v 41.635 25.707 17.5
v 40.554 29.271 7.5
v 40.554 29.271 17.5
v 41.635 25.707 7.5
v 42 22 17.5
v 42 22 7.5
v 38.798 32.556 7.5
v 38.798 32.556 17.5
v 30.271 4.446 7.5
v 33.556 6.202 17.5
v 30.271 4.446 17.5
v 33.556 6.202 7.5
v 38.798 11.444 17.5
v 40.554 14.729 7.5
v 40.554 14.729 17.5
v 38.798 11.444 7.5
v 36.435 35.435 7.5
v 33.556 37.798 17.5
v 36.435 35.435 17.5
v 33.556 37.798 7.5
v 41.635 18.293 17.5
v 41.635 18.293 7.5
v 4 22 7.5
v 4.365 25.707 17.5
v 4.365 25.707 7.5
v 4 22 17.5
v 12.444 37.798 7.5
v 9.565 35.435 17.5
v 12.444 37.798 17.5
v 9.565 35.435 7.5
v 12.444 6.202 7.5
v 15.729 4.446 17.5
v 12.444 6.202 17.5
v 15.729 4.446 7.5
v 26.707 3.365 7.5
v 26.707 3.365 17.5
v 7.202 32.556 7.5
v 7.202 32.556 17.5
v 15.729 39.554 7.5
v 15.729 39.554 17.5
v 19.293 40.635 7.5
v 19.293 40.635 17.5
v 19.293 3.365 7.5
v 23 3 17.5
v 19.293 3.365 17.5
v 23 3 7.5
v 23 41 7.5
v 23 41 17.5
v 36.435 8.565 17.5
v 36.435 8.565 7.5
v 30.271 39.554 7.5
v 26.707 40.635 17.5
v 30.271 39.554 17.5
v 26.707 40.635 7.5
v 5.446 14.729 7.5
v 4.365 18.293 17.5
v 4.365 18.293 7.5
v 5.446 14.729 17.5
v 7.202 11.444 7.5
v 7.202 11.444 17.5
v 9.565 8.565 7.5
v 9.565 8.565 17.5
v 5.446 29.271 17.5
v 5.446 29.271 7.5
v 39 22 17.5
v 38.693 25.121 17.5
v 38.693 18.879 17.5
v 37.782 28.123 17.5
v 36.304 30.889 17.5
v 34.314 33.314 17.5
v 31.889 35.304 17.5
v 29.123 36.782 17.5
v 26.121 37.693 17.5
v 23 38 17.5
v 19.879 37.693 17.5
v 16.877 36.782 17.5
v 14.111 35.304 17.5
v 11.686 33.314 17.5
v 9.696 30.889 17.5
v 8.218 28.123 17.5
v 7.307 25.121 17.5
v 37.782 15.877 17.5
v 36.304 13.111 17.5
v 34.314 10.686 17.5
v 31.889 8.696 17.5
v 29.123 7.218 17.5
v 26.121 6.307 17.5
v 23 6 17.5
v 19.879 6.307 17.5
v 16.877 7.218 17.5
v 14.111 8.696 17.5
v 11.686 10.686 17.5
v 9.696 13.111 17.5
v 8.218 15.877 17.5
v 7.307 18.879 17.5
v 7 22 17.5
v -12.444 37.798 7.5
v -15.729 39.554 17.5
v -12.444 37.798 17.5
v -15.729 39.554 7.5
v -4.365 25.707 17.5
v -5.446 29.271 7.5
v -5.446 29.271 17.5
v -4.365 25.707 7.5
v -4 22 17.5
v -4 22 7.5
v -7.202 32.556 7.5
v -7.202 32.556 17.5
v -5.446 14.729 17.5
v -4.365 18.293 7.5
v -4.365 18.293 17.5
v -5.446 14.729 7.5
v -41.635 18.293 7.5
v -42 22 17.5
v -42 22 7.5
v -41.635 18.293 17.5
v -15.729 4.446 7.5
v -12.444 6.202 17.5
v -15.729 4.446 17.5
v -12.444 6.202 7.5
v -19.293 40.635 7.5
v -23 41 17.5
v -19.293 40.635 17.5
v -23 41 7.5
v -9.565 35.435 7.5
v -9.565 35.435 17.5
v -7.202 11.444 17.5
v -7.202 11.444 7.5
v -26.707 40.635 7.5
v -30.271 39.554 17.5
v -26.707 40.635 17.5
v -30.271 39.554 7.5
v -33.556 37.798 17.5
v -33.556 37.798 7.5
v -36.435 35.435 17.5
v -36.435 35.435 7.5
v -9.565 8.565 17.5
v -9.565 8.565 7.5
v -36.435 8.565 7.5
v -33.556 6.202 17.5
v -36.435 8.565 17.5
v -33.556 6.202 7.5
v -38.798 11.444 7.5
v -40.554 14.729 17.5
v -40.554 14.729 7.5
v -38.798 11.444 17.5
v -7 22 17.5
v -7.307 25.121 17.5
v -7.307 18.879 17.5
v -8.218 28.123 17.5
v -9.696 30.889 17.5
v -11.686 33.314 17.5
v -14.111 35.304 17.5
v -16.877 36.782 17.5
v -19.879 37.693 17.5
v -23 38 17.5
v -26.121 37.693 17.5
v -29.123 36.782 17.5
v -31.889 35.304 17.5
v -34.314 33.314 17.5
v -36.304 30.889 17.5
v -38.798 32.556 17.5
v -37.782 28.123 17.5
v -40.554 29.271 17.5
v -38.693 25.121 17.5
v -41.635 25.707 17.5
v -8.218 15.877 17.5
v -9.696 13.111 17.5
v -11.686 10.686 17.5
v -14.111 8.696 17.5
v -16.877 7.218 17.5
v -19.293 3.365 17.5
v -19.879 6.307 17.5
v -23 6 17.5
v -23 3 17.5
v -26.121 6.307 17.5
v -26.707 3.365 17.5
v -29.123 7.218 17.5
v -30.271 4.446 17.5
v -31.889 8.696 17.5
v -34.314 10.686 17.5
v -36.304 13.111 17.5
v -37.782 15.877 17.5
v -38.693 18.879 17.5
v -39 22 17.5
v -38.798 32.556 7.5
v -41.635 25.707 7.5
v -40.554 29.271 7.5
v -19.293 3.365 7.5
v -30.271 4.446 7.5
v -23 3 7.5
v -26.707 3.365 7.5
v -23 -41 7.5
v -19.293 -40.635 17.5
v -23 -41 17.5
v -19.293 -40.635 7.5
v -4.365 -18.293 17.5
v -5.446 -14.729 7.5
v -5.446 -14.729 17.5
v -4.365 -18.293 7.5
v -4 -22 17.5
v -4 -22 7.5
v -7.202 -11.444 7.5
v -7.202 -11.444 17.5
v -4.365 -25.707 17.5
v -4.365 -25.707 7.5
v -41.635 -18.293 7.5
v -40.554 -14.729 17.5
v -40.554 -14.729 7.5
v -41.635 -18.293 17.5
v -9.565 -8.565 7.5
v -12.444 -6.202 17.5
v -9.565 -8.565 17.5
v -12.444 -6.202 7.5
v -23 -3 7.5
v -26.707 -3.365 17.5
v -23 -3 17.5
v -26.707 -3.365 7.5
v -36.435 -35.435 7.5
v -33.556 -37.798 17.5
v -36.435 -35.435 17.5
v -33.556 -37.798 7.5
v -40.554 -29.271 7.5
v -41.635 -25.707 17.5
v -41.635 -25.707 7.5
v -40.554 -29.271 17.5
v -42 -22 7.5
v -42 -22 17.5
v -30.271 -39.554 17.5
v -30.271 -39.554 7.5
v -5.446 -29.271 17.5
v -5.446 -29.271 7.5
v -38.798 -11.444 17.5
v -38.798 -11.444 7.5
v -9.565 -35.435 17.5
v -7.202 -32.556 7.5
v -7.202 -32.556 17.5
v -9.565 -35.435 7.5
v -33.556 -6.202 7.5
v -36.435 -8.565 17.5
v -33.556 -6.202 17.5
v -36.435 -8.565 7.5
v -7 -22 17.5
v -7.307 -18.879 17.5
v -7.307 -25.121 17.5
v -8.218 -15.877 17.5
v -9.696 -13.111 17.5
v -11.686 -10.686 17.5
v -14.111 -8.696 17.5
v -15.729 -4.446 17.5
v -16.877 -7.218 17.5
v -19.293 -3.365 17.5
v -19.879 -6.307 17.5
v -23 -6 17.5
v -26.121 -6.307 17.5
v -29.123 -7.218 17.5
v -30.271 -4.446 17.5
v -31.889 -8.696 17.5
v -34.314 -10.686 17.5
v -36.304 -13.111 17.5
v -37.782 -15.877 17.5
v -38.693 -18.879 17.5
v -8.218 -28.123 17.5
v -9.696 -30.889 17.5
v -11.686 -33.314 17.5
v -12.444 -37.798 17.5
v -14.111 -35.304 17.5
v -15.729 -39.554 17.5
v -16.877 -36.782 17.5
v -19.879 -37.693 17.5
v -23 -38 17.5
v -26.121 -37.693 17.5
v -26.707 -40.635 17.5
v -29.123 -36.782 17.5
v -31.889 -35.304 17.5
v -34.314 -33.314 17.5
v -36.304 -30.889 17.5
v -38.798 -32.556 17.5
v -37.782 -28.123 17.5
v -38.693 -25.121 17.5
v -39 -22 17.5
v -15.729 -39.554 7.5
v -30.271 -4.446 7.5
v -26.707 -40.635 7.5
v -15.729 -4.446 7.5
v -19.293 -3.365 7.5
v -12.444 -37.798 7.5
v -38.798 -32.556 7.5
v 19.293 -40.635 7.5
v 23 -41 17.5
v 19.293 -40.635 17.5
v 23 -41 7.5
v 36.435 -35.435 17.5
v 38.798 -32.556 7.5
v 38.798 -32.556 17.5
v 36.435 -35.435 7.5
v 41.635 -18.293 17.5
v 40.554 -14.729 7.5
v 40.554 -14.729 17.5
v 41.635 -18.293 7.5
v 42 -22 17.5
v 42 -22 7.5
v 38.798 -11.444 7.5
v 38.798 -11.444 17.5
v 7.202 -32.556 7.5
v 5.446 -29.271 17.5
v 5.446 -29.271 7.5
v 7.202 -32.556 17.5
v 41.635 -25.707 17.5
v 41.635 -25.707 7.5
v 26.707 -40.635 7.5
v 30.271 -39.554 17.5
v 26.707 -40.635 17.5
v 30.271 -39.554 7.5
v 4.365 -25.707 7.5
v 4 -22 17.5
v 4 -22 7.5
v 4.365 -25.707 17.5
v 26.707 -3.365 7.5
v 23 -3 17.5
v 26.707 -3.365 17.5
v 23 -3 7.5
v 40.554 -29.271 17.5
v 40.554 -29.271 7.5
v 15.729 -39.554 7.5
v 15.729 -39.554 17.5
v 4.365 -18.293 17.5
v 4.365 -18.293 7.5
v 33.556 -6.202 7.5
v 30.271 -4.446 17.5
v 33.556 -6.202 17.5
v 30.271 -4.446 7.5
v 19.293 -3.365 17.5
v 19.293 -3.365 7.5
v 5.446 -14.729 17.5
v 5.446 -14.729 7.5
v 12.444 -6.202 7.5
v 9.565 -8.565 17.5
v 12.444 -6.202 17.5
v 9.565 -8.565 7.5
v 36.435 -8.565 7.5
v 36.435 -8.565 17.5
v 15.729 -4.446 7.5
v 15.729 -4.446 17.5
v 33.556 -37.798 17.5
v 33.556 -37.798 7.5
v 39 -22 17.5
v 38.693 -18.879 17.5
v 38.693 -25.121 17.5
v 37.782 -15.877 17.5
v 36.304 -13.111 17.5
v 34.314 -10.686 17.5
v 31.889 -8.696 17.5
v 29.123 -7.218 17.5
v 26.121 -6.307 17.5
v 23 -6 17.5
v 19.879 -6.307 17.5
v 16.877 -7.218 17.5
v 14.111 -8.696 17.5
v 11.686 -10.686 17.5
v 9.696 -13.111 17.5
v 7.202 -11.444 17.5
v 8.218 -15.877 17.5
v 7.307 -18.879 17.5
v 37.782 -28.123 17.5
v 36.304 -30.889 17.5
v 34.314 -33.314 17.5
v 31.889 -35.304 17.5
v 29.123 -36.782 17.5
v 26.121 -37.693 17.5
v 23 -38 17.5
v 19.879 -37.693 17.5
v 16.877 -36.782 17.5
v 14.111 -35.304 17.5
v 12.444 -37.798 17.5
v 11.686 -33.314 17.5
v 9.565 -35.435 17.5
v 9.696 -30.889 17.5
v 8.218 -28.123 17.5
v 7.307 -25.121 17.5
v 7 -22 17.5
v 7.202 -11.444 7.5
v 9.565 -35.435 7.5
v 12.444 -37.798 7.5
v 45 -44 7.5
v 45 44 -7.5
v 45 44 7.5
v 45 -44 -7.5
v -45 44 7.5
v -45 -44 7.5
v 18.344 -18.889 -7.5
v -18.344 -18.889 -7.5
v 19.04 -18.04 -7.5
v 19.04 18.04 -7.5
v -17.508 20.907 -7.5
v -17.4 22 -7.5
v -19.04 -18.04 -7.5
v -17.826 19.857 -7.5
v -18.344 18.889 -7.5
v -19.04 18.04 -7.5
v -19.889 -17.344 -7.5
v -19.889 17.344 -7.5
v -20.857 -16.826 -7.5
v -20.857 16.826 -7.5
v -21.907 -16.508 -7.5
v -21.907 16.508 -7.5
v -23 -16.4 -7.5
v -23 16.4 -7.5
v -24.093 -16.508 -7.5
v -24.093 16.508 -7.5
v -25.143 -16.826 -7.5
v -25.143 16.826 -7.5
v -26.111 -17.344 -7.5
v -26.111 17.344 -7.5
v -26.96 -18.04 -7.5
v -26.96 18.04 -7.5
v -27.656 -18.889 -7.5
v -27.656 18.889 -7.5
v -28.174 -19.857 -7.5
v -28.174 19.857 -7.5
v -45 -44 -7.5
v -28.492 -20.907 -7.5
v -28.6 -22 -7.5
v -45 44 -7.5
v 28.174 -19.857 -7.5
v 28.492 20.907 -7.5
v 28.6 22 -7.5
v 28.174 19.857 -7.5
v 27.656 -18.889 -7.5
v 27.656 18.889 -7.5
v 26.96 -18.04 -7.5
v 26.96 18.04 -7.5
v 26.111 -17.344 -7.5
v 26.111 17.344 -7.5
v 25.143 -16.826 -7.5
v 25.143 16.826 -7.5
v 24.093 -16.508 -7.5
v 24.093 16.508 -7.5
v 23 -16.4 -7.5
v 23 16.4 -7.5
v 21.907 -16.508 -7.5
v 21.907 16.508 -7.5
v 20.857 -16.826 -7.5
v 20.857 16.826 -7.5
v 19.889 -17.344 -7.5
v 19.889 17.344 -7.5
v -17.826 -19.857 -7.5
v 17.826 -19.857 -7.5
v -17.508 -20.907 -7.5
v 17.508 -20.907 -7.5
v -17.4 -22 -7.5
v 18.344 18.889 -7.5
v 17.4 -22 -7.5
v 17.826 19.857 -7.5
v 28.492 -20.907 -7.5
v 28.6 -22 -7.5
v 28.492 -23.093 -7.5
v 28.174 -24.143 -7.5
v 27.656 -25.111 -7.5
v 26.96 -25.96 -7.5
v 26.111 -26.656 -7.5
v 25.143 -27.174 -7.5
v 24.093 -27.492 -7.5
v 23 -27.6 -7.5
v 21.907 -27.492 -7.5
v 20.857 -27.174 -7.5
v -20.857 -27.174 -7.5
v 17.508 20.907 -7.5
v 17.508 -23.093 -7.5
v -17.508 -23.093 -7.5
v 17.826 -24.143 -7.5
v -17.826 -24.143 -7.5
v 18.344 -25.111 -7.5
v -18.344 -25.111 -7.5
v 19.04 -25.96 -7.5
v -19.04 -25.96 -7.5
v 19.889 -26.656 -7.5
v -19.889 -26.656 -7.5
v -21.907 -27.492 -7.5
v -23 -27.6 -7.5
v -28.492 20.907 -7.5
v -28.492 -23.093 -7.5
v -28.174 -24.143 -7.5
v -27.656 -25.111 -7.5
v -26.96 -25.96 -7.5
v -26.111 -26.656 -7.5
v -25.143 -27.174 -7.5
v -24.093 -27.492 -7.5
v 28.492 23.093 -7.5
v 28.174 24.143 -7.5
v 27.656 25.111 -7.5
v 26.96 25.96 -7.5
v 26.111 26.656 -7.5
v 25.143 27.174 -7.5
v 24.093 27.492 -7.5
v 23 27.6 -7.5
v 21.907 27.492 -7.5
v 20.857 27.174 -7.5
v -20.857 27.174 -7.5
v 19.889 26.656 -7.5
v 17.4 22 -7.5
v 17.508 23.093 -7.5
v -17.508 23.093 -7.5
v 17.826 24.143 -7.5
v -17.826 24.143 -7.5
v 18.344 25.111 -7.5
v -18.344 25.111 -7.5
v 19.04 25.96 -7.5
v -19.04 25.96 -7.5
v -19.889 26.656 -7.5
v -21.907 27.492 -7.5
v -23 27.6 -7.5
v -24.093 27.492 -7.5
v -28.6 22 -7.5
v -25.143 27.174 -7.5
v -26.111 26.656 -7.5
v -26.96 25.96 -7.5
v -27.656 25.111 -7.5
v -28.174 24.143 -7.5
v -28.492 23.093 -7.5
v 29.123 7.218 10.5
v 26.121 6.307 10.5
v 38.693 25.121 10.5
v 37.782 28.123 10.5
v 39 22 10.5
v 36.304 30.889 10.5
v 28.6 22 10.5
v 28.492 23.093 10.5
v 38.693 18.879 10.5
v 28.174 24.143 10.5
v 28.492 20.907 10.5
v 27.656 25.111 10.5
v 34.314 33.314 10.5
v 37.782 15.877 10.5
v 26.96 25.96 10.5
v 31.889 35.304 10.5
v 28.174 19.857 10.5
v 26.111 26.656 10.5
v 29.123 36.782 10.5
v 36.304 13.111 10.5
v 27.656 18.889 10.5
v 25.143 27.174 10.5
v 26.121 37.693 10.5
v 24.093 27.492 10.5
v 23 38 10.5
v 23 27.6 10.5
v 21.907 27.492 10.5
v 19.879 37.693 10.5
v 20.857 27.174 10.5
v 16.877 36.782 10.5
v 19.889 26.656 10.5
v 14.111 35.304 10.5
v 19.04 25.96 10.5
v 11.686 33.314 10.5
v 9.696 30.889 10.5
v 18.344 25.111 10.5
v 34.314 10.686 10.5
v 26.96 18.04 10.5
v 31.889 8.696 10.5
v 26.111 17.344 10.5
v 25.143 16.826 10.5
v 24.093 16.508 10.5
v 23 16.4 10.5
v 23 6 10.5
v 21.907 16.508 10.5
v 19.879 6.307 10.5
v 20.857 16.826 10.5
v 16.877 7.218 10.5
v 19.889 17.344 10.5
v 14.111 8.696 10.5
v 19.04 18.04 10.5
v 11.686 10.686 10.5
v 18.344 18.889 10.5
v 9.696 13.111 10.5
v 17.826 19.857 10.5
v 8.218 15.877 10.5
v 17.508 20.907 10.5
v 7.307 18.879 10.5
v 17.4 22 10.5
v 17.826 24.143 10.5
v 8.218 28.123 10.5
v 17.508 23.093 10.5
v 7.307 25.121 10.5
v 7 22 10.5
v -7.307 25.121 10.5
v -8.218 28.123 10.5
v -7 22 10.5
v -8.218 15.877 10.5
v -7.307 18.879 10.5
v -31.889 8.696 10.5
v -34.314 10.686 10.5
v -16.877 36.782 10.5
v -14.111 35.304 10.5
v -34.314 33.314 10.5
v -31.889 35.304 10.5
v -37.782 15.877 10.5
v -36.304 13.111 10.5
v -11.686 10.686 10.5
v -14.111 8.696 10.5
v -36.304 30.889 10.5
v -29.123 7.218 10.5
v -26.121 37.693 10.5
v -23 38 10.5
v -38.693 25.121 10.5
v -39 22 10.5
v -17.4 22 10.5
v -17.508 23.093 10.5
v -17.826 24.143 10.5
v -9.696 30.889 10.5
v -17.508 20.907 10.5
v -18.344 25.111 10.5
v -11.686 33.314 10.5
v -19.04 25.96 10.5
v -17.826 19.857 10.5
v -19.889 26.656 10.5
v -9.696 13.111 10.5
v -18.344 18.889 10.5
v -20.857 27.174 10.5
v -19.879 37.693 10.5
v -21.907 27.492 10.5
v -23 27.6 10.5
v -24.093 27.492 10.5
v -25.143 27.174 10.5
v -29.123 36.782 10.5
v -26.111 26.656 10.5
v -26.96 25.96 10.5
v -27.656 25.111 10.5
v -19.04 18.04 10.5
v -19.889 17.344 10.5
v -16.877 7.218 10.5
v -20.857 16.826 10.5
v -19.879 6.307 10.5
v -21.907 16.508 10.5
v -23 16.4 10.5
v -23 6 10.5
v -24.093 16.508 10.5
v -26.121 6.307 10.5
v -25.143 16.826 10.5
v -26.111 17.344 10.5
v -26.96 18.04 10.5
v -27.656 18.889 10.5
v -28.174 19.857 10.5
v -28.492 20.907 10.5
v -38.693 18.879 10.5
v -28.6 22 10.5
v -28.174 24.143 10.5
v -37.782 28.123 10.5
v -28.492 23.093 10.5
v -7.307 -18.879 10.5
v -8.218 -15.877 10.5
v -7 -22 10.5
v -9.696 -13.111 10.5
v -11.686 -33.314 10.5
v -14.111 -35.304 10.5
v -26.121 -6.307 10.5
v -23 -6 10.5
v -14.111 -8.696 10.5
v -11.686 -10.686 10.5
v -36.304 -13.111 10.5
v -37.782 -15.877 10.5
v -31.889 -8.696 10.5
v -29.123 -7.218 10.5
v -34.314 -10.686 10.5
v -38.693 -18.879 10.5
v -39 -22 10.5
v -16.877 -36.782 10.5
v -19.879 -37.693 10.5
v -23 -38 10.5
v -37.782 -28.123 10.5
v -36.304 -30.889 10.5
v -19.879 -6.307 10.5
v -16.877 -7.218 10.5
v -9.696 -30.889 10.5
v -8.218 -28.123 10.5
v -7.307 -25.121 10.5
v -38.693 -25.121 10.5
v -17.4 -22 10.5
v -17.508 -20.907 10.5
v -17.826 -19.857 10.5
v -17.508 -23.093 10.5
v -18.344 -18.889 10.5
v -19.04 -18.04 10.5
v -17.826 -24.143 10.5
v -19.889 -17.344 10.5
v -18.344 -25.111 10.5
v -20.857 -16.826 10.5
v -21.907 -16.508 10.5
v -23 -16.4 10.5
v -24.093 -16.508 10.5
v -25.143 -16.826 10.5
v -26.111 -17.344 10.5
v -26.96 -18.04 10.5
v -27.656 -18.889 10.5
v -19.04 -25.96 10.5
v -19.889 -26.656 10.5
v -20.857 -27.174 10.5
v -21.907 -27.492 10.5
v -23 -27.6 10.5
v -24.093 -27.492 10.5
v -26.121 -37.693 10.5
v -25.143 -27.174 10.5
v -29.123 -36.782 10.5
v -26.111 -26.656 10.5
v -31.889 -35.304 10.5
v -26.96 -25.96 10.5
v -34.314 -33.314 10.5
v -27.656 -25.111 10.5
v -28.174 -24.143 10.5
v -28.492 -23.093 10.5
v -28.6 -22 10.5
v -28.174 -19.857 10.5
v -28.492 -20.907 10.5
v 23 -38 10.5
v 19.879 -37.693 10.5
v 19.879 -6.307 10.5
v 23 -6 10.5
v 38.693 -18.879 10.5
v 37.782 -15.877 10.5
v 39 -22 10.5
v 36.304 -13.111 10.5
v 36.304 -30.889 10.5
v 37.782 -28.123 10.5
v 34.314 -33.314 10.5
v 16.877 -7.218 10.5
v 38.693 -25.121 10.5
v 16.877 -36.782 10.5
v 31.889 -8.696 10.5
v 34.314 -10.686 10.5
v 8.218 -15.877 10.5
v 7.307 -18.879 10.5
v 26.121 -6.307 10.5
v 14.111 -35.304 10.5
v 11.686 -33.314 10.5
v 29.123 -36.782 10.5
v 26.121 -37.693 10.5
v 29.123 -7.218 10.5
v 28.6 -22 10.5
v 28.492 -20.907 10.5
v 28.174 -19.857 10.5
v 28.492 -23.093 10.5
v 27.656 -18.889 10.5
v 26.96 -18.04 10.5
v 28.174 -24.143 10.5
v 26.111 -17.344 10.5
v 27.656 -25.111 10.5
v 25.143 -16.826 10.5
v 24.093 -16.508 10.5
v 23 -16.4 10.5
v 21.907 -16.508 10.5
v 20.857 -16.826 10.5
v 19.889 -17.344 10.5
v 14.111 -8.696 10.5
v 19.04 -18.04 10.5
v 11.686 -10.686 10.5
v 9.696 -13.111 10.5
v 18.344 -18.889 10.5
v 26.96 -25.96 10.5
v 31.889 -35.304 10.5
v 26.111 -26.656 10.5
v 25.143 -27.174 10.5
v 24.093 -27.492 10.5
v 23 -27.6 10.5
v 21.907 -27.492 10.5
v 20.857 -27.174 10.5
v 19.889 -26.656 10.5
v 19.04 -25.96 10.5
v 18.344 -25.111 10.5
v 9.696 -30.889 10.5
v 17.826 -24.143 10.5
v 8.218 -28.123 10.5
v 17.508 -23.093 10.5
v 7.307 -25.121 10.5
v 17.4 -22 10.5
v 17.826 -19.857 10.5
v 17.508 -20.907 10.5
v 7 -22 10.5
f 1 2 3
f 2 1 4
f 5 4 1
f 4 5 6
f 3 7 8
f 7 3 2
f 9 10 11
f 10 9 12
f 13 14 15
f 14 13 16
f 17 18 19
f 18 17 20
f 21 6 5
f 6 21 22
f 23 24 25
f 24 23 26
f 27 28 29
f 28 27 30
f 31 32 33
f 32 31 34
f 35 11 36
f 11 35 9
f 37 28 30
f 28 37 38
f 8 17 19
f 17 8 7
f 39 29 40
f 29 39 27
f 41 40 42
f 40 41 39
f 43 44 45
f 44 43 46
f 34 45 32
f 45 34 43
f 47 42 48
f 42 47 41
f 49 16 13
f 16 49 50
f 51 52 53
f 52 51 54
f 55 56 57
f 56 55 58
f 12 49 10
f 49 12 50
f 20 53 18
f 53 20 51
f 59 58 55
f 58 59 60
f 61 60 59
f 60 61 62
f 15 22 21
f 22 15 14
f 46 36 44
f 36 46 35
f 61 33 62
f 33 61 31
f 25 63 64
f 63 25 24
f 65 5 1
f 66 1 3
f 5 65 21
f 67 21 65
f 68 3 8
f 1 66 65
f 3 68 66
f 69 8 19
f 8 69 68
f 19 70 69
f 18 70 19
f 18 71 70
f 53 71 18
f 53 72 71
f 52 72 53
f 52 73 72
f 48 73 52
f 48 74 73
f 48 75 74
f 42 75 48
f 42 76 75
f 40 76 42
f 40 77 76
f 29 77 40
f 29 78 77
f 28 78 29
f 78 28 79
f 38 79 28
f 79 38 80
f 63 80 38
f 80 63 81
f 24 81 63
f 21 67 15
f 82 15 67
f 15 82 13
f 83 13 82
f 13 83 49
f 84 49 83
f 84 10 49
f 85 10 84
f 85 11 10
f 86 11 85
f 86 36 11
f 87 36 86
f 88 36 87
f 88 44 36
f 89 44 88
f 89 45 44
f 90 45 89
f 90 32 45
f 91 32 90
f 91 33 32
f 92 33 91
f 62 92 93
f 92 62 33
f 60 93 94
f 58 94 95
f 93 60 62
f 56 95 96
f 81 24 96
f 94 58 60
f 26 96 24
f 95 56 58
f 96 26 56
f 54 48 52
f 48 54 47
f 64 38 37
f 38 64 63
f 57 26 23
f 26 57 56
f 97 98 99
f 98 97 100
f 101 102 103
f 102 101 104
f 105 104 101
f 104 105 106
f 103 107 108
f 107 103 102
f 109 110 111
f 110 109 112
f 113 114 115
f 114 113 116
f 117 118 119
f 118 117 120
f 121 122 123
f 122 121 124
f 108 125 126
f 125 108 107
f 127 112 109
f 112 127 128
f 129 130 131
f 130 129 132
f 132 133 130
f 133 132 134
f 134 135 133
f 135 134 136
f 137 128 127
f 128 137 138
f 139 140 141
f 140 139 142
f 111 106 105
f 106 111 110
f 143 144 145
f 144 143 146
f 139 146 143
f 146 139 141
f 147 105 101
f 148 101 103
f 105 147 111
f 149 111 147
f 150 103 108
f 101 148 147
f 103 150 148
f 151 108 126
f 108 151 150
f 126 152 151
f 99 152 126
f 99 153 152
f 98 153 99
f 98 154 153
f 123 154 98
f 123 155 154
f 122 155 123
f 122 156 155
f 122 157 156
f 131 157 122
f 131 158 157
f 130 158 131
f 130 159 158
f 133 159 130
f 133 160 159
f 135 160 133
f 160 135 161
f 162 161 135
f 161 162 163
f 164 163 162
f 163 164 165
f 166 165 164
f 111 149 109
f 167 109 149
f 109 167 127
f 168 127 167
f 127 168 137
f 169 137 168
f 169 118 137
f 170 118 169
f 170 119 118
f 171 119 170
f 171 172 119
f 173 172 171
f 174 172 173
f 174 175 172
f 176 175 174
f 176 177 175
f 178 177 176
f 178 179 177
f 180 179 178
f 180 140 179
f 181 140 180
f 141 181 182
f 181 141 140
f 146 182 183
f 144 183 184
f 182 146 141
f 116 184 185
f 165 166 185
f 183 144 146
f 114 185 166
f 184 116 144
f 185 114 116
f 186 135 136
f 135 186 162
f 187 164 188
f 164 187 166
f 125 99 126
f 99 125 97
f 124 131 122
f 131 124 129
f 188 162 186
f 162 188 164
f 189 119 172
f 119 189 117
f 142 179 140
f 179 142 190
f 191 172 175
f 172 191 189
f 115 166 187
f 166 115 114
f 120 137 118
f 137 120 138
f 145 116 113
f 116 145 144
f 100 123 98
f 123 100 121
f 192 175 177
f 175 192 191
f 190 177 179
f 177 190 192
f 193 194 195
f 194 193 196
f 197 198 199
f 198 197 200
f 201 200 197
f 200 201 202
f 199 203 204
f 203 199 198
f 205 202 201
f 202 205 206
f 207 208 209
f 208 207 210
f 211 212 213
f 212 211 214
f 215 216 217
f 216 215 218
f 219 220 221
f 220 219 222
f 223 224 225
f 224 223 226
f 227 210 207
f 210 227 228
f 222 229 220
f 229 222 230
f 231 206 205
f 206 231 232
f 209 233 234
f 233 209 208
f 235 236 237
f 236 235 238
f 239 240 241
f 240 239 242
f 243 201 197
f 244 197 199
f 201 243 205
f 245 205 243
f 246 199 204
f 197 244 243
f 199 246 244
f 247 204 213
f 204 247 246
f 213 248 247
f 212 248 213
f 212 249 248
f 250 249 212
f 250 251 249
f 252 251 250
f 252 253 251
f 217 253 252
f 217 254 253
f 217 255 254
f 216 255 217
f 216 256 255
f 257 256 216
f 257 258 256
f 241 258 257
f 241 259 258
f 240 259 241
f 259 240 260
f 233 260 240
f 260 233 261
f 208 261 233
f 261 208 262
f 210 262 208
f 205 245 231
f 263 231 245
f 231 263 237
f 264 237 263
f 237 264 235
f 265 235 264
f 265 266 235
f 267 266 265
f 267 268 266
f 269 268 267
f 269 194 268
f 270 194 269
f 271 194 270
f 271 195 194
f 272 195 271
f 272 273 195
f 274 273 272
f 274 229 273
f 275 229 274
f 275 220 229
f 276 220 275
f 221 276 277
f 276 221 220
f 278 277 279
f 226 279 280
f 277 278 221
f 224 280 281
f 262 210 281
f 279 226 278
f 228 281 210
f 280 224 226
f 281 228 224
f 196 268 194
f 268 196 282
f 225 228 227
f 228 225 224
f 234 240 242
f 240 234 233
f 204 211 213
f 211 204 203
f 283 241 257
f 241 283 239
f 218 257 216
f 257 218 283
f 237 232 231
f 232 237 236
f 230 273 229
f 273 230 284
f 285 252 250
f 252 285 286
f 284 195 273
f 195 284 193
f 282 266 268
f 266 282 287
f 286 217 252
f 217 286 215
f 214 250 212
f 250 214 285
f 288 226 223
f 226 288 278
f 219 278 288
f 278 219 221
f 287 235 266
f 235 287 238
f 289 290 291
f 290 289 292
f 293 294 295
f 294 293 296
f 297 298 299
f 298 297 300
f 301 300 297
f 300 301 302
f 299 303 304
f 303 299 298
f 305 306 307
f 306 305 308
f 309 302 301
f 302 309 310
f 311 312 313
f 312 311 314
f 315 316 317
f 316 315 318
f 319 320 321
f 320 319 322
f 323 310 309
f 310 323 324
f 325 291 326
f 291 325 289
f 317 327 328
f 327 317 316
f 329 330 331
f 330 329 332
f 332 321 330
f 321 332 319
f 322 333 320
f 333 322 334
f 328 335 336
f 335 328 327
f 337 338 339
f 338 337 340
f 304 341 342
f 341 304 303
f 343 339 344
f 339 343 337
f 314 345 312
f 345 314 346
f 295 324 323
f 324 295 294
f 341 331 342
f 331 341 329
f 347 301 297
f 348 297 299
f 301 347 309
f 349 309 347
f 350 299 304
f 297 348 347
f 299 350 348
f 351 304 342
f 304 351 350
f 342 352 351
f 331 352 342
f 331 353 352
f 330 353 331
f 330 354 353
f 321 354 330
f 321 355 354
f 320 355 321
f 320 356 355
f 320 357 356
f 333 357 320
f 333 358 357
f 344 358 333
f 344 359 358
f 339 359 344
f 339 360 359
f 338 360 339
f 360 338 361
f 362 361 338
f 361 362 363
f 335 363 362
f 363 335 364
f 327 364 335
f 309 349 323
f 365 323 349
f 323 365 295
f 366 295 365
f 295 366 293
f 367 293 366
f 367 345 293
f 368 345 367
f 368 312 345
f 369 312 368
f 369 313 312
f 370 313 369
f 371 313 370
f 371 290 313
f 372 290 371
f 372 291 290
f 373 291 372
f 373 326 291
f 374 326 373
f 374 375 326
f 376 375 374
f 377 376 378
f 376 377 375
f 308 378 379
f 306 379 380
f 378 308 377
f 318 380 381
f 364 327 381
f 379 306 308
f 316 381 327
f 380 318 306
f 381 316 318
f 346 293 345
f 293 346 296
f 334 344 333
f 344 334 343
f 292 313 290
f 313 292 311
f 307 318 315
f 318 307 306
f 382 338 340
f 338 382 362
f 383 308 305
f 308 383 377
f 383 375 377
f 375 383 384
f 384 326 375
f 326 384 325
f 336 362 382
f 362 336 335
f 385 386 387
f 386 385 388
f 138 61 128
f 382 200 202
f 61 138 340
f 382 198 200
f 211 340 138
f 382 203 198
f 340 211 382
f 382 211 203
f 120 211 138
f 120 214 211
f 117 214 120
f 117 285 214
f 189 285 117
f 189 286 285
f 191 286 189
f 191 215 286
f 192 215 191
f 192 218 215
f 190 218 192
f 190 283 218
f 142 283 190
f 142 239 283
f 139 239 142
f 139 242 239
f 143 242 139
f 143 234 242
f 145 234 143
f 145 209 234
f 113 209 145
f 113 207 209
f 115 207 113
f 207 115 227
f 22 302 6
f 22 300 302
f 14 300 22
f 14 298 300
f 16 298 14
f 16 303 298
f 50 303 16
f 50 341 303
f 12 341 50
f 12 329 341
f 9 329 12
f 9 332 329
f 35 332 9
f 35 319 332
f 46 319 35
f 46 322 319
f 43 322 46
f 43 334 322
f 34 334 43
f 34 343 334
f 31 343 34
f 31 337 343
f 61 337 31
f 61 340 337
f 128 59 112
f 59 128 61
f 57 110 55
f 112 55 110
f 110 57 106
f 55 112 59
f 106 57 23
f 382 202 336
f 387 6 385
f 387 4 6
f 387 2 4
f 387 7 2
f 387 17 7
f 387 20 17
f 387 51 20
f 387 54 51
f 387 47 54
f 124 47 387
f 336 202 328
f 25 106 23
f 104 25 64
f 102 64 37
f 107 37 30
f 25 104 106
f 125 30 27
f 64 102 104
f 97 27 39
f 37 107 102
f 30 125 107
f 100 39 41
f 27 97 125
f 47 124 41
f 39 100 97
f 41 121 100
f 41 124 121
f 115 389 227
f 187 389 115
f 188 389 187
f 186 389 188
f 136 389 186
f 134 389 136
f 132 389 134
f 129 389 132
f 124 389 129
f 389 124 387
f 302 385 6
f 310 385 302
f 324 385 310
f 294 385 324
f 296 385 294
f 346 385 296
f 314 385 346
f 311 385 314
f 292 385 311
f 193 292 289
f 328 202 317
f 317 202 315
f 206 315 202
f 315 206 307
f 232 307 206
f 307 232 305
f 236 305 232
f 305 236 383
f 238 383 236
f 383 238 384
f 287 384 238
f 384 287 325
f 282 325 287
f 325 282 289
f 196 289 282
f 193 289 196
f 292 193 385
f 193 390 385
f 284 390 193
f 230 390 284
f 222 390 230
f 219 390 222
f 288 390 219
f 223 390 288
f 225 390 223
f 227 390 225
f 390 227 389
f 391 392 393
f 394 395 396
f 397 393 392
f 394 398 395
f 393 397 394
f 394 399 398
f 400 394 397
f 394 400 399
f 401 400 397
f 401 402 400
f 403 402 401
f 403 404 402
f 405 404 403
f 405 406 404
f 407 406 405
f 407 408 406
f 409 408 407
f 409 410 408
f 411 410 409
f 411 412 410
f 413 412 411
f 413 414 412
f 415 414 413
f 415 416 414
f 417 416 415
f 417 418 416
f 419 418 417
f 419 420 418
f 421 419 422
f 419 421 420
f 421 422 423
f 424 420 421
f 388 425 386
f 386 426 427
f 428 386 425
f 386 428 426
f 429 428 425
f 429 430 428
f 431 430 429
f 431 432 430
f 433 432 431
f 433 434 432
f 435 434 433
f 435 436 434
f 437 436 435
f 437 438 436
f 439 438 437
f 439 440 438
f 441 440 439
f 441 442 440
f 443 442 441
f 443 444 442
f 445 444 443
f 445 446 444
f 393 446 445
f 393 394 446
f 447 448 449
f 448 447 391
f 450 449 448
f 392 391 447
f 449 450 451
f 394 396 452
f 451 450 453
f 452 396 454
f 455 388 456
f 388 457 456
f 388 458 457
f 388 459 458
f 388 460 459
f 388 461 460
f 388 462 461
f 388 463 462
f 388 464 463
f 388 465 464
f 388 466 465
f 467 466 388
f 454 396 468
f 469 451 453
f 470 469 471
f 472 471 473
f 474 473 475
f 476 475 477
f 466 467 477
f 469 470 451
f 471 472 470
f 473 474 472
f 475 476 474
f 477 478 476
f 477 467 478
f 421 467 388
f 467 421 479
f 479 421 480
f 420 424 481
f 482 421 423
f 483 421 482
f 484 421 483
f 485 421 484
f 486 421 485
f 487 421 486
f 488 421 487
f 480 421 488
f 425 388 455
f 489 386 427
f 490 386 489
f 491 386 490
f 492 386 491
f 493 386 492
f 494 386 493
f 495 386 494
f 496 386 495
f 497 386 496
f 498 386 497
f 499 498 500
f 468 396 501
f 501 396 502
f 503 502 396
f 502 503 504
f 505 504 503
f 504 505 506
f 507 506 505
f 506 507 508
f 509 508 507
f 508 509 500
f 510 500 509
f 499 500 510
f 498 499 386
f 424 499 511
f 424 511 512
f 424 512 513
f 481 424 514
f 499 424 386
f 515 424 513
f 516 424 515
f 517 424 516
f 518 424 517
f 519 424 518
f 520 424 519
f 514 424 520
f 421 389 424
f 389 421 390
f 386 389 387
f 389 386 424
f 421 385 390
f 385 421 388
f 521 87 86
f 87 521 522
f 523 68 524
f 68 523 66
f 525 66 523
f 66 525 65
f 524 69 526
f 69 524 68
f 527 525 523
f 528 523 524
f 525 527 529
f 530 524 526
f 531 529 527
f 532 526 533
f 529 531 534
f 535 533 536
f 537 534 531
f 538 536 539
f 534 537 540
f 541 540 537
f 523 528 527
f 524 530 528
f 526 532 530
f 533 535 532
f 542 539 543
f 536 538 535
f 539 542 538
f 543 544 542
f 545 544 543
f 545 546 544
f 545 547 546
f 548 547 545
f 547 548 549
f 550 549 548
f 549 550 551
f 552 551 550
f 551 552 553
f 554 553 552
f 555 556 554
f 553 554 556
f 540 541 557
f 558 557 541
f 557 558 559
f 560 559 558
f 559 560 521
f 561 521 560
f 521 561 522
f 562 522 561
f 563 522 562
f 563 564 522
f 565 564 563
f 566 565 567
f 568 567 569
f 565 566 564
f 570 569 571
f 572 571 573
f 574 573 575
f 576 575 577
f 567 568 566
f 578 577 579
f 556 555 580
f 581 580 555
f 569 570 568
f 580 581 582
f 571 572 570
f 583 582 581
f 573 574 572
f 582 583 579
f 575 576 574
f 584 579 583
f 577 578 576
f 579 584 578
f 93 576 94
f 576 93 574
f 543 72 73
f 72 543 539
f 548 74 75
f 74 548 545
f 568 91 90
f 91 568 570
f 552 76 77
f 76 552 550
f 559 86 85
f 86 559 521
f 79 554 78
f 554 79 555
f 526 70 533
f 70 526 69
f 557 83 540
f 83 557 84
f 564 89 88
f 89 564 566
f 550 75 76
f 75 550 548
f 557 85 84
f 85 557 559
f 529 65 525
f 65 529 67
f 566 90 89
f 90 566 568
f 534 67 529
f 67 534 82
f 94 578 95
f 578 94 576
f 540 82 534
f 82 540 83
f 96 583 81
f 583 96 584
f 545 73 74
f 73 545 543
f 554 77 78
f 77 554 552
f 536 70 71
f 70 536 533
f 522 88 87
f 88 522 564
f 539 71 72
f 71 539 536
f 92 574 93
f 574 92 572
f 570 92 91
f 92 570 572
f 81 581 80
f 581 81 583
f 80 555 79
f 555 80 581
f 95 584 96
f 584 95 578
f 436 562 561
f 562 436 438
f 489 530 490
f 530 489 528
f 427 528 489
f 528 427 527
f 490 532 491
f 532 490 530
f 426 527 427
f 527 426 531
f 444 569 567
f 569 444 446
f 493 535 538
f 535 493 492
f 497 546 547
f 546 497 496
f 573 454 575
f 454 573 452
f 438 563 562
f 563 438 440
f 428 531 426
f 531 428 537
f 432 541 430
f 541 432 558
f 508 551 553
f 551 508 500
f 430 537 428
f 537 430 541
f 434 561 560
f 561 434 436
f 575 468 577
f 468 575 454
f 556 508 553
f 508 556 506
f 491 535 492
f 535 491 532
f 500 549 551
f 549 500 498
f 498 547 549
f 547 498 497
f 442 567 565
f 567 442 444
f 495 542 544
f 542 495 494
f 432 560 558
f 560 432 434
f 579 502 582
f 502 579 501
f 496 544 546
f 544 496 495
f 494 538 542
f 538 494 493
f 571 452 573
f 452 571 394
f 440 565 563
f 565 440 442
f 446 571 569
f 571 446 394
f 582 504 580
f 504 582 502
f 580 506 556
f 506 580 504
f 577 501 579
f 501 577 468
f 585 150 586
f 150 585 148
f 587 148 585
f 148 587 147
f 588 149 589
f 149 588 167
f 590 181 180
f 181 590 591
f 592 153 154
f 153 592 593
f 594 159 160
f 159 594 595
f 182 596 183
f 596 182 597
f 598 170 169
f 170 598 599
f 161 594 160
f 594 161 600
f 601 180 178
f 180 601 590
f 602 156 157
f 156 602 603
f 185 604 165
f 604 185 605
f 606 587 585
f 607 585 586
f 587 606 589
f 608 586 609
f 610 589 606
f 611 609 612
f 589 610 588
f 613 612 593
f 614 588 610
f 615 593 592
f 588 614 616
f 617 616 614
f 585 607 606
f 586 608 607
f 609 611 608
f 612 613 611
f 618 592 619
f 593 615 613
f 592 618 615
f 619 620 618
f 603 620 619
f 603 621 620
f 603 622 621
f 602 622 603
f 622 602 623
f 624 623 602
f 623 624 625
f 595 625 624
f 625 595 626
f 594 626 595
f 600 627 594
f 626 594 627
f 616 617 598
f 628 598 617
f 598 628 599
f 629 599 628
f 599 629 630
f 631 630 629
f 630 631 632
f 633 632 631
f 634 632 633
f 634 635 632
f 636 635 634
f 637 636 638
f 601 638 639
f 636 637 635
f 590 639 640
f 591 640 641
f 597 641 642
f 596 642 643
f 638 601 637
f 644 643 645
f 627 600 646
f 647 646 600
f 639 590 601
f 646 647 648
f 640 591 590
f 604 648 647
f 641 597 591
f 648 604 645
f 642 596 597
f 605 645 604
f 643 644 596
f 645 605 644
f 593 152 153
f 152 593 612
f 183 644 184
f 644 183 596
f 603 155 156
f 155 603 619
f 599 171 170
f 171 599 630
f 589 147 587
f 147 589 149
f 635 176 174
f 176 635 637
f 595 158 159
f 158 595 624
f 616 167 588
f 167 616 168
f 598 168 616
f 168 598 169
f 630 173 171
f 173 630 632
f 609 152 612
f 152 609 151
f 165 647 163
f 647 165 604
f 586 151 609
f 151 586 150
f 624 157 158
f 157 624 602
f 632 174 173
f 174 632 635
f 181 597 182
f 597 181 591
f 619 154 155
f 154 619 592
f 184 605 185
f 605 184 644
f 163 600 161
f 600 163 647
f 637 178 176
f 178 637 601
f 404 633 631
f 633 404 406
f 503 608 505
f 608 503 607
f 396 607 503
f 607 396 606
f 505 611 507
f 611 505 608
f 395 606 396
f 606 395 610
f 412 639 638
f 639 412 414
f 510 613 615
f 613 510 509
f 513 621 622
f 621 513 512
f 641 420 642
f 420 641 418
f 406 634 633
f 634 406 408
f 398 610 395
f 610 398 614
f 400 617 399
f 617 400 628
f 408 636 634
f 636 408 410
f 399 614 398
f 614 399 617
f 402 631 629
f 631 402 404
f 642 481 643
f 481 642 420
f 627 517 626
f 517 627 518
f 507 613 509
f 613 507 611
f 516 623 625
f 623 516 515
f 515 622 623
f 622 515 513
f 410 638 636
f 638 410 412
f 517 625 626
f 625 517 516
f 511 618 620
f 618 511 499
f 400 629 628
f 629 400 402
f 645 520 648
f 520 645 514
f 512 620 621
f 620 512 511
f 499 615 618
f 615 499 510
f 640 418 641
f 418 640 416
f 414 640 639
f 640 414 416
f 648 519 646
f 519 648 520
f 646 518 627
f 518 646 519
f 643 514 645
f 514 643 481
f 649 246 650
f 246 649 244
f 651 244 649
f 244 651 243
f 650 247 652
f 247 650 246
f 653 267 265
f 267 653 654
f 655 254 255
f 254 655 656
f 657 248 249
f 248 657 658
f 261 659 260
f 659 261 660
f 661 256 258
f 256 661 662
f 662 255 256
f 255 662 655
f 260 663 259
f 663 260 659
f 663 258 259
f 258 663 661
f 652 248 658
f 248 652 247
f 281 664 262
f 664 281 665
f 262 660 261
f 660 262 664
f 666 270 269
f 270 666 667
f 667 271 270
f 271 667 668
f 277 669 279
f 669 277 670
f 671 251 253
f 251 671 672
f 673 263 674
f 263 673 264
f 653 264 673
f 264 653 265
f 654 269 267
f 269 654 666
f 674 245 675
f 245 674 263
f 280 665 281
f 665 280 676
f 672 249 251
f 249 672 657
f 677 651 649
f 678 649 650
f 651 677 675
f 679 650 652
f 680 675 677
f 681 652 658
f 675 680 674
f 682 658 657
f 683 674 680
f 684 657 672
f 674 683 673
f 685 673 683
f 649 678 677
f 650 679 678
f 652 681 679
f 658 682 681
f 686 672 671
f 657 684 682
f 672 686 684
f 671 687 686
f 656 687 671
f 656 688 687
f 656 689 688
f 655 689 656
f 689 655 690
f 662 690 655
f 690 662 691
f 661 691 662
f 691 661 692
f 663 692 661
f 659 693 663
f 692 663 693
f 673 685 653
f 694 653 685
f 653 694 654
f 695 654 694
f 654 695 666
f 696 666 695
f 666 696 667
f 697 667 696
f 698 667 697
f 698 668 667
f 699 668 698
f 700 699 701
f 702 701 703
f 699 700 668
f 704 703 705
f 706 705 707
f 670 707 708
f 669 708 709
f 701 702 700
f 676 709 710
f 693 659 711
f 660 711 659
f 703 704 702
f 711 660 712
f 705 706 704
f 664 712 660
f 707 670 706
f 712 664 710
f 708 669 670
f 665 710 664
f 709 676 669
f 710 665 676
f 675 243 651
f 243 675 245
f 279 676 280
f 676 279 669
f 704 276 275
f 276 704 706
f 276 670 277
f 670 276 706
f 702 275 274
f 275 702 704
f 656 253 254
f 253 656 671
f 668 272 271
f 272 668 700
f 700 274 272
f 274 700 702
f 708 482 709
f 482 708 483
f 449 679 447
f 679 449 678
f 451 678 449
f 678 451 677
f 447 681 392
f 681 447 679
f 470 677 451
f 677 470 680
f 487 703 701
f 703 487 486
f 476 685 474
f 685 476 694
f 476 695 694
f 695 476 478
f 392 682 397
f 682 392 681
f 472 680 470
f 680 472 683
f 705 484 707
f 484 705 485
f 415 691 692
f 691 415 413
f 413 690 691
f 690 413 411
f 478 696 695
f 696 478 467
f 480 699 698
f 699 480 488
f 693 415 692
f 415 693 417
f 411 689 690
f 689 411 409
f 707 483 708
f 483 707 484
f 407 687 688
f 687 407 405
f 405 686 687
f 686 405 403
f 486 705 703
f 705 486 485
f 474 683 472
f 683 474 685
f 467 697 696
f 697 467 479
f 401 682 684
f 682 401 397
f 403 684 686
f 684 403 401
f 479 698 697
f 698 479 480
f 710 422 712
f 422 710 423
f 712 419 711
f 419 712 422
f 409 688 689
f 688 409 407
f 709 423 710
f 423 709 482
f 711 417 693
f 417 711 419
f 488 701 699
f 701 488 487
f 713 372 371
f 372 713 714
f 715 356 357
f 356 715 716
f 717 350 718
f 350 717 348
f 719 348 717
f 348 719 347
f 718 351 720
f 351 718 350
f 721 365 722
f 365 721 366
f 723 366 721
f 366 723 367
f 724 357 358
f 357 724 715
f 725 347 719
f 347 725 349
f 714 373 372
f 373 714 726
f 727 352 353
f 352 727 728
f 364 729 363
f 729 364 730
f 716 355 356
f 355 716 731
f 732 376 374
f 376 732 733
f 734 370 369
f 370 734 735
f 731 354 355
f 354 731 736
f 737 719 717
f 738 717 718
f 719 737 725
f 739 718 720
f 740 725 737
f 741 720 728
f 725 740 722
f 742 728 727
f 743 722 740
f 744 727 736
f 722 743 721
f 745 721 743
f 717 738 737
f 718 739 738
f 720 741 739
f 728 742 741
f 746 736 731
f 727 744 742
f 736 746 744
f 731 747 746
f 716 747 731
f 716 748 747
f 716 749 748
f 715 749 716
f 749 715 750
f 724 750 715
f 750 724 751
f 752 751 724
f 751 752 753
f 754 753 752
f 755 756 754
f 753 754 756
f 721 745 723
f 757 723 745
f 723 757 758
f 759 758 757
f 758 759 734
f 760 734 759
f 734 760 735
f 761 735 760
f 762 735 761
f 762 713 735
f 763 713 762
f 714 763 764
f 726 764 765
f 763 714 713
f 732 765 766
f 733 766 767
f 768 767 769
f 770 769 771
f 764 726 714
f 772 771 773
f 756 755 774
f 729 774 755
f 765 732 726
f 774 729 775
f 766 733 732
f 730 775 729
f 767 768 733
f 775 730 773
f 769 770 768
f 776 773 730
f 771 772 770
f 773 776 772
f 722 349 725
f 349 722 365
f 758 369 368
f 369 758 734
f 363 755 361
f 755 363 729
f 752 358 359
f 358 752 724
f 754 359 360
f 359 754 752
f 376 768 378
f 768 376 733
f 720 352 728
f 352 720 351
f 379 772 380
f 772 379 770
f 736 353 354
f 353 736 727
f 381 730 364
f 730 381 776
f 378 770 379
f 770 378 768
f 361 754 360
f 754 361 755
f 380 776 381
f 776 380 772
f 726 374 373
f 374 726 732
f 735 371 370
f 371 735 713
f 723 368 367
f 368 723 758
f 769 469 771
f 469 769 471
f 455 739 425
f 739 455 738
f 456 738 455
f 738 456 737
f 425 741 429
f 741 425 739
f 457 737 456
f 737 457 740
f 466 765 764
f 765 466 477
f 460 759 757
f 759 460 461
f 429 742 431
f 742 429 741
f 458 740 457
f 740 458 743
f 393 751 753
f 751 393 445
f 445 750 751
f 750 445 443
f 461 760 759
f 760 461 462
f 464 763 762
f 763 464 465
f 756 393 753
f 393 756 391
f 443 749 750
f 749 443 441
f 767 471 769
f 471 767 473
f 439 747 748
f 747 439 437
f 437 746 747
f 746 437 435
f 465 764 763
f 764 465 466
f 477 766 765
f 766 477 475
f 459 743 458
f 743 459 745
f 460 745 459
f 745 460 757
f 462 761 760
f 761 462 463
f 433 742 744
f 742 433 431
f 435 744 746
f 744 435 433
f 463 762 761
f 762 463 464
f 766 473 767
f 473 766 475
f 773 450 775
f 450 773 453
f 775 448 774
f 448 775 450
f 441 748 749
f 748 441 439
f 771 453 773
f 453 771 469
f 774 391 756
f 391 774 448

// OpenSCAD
$fn = 32;

// ----------------------------------------------------------------------
// Socket pad plate
// bosses with counterbored sockets for the screws
// ----------------------------------------------------------------------

// --- parameters (mm) ---
base_t = 15;           // base plate thickness
boss_h = 10;           // boss height above the base plate
boss_d = 38;           // boss diameter
socket_d = 32;         // socket diameter
socket_depth = 7;      // socket depth from the boss face
bolt_d = 11.2;         // screw clearance hole through the socket floor
plate = [90, 88, 15];  // overall size (x, y, z)
edge = 22;             // boss centre offset from the plate edge
pads = 4;              // boss count, one per corner

// --- derived feature positions (mm) ---
height = base_t + boss_h;        // = 25   overall height of the part
corner_x = plate[0] / 2 - edge;  // = 23   boss centre X
corner_y = plate[1] / 2 - edge;  // = 22   boss centre Y
feature_centers = [
  [corner_x, corner_y],
  [-corner_x, corner_y],
  [-corner_x, -corner_y],
  [corner_x, -corner_y]
];   // boss centres: sockets, holes and the pads themselves are placed from here

// base plate, bosses on feature_centers, socket + through hole in each
difference() {
  union() {
    cube(plate, center = true);
    for (centre = feature_centers)
      translate([centre[0], centre[1], plate[2] / 2 - 1])
        cylinder(d = boss_d, h = boss_h + 1);
  }
  for (centre = feature_centers) {
    translate([centre[0], centre[1], plate[2] / 2 + boss_h - socket_depth])
      cylinder(d = socket_d, h = socket_depth + 1);
    translate([centre[0], centre[1], -height])
      cylinder(d = bolt_d, h = 2 * height + 2);  // through the socket floor
  }
}
